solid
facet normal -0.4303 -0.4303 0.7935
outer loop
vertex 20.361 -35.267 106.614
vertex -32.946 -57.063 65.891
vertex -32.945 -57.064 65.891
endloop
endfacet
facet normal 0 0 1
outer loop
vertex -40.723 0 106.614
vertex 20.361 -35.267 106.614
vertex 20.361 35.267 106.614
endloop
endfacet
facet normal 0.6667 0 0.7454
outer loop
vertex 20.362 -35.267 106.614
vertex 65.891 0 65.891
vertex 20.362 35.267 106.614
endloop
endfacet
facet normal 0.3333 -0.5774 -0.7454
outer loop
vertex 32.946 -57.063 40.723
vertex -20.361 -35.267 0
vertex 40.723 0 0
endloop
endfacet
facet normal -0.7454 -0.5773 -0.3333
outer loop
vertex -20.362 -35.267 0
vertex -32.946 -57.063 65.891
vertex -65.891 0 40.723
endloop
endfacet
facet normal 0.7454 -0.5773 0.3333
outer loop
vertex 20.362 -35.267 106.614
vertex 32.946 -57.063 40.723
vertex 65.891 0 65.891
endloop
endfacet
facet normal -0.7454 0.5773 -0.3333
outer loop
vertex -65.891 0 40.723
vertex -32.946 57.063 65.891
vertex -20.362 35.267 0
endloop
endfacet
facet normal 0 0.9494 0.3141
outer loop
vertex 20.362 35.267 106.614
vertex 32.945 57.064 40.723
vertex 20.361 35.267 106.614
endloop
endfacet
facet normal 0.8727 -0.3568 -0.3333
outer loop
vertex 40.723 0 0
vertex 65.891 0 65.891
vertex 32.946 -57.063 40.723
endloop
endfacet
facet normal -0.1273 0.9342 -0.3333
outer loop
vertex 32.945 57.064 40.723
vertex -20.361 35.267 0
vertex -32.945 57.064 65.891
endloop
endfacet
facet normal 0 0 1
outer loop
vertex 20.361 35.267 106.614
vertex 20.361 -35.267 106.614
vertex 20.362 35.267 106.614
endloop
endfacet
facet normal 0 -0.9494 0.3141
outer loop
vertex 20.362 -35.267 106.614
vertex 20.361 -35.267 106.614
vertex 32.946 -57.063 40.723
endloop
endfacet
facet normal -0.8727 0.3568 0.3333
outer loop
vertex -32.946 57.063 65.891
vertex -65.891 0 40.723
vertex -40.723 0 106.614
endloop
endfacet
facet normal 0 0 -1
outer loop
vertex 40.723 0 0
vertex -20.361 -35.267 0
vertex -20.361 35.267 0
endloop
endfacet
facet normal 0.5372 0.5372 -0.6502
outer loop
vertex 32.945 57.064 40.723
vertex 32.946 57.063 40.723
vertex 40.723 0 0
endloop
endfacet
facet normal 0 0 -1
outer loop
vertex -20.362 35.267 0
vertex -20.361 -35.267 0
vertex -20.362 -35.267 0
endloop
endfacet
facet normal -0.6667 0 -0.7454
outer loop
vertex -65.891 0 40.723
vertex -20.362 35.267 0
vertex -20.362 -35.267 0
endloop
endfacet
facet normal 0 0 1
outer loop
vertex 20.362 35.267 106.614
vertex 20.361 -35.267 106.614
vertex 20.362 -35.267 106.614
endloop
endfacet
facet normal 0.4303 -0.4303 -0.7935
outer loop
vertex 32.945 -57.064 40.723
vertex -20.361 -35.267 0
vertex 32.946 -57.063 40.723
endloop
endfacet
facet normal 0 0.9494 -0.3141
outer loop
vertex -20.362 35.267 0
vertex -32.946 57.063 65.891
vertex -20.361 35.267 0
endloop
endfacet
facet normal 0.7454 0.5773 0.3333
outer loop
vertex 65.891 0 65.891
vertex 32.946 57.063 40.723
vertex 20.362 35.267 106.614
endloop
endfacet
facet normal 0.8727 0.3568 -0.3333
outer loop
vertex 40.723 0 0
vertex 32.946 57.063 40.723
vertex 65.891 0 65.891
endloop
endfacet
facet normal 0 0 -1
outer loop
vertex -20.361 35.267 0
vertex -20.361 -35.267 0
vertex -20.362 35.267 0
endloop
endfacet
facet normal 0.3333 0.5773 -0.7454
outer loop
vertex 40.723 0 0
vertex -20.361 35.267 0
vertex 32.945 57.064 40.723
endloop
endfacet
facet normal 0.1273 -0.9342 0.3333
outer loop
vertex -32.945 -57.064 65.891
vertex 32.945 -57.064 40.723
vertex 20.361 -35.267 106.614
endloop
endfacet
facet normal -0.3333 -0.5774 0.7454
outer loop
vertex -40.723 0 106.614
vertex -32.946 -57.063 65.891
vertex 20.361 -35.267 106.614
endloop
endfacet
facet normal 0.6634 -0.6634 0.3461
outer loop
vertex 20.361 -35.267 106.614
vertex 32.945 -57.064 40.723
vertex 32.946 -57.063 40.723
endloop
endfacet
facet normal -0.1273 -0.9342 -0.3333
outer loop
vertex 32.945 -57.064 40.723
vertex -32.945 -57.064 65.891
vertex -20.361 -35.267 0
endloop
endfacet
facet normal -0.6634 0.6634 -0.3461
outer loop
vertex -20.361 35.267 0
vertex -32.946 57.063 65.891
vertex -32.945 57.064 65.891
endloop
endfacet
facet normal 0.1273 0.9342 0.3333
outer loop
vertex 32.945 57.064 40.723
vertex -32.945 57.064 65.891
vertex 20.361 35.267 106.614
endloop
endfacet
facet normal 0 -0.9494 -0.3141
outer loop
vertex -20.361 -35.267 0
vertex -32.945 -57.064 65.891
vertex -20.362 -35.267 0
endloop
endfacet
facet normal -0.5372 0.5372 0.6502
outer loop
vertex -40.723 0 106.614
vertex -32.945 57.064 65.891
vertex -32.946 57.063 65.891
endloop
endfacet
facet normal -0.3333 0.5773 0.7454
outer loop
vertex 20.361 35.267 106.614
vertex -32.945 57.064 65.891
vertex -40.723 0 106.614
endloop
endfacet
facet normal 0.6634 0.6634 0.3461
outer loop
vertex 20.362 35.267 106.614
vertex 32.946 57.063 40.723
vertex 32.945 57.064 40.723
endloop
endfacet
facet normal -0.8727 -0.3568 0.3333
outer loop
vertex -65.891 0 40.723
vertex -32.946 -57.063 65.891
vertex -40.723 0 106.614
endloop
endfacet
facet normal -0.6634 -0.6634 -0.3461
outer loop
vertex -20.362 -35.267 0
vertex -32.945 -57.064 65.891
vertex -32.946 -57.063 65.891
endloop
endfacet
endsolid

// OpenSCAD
radius = 60;

base = radius * 2 * sin(36) / sqrt(3);
echo(base);

phi = (1 + sqrt(5)) / 2;
r = (1 + sqrt(5)) / 2;
epsilon = 0.00001;

module g(p) {
    translate(p) cube([epsilon, epsilon, epsilon], center=true);
}

scale(base) hull() {
    for (i = [0 : 3]) {
        rotate(i * 120) {
            g([1, 0, 0]);
            g([r, 0, phi]);
            rotate(60) g([phi, 0, 1]);
            rotate(60) g([1, 0, phi + 1]);
        }
    }
}
